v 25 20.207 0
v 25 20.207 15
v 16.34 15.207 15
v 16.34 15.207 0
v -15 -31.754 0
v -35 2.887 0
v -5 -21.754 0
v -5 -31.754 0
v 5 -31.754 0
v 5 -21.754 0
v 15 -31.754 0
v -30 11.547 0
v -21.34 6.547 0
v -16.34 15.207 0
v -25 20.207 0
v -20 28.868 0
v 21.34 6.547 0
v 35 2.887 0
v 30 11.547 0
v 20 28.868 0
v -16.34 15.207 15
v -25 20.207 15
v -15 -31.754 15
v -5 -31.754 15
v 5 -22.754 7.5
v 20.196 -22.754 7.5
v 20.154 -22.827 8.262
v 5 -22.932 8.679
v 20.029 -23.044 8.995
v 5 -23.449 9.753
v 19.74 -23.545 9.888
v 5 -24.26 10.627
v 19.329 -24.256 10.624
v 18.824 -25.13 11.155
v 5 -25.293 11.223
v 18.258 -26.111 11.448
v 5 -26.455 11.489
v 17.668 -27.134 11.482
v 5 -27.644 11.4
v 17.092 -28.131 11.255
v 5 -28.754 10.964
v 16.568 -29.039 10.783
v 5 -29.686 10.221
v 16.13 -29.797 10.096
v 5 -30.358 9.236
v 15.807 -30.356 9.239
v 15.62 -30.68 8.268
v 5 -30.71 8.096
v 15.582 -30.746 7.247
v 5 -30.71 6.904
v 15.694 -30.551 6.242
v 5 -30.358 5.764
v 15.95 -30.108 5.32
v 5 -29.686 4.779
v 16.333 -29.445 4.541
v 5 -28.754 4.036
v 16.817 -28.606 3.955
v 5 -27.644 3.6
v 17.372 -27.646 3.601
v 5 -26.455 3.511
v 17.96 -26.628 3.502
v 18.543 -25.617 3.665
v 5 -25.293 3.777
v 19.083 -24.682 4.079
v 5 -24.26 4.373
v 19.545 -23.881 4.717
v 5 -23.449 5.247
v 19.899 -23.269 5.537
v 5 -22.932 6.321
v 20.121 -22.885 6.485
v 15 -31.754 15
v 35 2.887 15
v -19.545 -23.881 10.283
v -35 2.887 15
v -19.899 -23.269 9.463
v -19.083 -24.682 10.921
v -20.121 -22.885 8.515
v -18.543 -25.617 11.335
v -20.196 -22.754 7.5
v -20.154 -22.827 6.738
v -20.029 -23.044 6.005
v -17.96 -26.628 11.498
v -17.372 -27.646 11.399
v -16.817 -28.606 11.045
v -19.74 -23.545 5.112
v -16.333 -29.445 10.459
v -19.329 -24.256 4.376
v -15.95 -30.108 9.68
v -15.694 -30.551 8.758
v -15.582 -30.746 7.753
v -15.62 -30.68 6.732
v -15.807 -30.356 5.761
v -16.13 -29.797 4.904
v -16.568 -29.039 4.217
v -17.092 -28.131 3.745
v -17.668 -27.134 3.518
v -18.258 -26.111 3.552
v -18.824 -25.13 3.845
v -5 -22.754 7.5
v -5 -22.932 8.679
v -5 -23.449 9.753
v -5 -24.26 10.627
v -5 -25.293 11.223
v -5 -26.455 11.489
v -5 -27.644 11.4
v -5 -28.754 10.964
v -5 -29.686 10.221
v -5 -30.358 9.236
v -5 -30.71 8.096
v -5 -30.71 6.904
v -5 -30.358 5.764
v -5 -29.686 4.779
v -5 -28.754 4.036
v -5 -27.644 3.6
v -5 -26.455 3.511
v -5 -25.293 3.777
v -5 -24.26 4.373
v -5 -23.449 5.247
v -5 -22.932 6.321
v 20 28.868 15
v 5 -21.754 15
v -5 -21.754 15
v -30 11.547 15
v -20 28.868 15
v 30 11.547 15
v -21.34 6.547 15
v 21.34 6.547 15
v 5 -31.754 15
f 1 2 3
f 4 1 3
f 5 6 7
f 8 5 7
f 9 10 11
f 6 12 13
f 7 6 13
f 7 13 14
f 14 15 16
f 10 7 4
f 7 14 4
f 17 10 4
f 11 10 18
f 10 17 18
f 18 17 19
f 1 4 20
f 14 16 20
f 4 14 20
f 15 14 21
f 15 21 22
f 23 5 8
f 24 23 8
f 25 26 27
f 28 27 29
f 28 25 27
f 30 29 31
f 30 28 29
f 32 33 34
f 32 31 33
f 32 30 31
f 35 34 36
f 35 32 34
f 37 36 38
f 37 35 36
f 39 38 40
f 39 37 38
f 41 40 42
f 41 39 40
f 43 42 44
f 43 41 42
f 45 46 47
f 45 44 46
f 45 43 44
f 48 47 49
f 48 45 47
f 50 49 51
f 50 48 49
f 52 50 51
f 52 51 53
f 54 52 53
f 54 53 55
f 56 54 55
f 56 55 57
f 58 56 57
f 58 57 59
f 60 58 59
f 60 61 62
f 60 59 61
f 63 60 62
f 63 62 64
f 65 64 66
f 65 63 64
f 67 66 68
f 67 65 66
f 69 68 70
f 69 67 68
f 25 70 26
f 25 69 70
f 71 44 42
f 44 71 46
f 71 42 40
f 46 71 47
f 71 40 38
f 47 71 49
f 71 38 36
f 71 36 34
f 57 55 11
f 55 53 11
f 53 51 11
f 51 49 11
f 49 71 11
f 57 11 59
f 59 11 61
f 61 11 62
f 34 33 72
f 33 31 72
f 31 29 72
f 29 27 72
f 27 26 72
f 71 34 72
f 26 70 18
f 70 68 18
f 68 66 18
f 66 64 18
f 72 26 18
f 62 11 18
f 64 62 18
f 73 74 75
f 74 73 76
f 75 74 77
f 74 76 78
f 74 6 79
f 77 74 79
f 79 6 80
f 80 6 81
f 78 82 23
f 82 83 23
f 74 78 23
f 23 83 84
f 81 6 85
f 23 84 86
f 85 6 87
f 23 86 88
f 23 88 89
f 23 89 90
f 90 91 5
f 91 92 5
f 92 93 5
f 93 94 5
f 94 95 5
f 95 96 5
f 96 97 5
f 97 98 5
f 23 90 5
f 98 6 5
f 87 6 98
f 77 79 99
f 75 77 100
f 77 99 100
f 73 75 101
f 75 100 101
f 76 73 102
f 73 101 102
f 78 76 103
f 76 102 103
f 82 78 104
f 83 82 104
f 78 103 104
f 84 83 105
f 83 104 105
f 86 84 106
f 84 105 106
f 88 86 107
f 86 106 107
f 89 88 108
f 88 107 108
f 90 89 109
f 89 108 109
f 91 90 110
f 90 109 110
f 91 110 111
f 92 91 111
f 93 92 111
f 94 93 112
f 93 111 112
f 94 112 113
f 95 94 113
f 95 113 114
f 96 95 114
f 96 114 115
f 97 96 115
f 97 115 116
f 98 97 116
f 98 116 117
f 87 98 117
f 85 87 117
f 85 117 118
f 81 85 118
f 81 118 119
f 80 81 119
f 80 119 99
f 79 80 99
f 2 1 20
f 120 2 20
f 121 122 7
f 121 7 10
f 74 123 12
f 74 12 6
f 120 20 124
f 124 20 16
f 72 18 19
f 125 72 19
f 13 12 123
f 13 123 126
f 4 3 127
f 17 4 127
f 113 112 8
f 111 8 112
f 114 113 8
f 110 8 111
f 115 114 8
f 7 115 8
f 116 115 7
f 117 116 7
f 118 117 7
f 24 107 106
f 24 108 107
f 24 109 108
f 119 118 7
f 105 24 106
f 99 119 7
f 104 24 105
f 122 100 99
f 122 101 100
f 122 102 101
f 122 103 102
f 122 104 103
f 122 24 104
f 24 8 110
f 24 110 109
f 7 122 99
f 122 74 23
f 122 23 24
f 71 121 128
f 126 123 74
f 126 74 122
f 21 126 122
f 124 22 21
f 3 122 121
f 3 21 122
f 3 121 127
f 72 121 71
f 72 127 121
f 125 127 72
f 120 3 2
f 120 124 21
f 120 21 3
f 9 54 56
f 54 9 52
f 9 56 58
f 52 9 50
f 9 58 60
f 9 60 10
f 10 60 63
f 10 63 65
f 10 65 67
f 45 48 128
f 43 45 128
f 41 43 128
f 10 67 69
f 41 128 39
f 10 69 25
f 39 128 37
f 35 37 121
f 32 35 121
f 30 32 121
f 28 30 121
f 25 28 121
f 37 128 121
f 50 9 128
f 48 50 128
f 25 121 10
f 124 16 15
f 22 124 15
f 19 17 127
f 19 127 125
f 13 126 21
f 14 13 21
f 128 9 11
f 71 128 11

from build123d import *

# Parameters (mm, degrees)
F1_DEPTH      = 15
F2_W          = 10
F2_H          = 20
F3_DEPTH      = 15.001
F4_R          = 4
F5_DEPTH      = 30.001
F5_DEPTH_BACK = 40.001


with BuildPart() as f1:
    # F0 (on Top) → F1 (new body)
    with BuildSketch(Plane.XY):
        Polygon((-20, 28.8675134595), (-35, 2.8867513459), (-15, -31.7542648054), (15, -31.7542648054), (35, 2.8867513459), (20, 28.8675134595), align=None)
    extrude(amount=F1_DEPTH)

    # F2 (on face) → F3 (cut, through all)
    with BuildSketch(Plane.XY.offset(15)):
        with Locations((0, -31.7542648054)):
            Rectangle(F2_W, F2_H)
        Polygon((-38.6602540378, 16.5470053838), (-21.3397459622, 6.5470053838), (-16.3397459622, 15.2072594216), (-33.6602540378, 25.2072594216), align=None)
        Polygon((33.6602540378, 25.2072594216), (16.3397459622, 15.2072594216), (21.3397459622, 6.5470053838), (38.6602540378, 16.5470053838), align=None)
    extrude(amount=-F3_DEPTH, mode=Mode.SUBTRACT)

    # F4 (on face) → F5 (cut, two sides)
    with BuildSketch(Plane.YZ.offset(-5)) as f5_sk:
        with Locations((-26.7542648054, 7.5)):
            Circle(F4_R)
    extrude(amount=-F5_DEPTH, mode=Mode.SUBTRACT)
    extrude(f5_sk.sketch, amount=F5_DEPTH_BACK, mode=Mode.SUBTRACT)


solid = f1.part
